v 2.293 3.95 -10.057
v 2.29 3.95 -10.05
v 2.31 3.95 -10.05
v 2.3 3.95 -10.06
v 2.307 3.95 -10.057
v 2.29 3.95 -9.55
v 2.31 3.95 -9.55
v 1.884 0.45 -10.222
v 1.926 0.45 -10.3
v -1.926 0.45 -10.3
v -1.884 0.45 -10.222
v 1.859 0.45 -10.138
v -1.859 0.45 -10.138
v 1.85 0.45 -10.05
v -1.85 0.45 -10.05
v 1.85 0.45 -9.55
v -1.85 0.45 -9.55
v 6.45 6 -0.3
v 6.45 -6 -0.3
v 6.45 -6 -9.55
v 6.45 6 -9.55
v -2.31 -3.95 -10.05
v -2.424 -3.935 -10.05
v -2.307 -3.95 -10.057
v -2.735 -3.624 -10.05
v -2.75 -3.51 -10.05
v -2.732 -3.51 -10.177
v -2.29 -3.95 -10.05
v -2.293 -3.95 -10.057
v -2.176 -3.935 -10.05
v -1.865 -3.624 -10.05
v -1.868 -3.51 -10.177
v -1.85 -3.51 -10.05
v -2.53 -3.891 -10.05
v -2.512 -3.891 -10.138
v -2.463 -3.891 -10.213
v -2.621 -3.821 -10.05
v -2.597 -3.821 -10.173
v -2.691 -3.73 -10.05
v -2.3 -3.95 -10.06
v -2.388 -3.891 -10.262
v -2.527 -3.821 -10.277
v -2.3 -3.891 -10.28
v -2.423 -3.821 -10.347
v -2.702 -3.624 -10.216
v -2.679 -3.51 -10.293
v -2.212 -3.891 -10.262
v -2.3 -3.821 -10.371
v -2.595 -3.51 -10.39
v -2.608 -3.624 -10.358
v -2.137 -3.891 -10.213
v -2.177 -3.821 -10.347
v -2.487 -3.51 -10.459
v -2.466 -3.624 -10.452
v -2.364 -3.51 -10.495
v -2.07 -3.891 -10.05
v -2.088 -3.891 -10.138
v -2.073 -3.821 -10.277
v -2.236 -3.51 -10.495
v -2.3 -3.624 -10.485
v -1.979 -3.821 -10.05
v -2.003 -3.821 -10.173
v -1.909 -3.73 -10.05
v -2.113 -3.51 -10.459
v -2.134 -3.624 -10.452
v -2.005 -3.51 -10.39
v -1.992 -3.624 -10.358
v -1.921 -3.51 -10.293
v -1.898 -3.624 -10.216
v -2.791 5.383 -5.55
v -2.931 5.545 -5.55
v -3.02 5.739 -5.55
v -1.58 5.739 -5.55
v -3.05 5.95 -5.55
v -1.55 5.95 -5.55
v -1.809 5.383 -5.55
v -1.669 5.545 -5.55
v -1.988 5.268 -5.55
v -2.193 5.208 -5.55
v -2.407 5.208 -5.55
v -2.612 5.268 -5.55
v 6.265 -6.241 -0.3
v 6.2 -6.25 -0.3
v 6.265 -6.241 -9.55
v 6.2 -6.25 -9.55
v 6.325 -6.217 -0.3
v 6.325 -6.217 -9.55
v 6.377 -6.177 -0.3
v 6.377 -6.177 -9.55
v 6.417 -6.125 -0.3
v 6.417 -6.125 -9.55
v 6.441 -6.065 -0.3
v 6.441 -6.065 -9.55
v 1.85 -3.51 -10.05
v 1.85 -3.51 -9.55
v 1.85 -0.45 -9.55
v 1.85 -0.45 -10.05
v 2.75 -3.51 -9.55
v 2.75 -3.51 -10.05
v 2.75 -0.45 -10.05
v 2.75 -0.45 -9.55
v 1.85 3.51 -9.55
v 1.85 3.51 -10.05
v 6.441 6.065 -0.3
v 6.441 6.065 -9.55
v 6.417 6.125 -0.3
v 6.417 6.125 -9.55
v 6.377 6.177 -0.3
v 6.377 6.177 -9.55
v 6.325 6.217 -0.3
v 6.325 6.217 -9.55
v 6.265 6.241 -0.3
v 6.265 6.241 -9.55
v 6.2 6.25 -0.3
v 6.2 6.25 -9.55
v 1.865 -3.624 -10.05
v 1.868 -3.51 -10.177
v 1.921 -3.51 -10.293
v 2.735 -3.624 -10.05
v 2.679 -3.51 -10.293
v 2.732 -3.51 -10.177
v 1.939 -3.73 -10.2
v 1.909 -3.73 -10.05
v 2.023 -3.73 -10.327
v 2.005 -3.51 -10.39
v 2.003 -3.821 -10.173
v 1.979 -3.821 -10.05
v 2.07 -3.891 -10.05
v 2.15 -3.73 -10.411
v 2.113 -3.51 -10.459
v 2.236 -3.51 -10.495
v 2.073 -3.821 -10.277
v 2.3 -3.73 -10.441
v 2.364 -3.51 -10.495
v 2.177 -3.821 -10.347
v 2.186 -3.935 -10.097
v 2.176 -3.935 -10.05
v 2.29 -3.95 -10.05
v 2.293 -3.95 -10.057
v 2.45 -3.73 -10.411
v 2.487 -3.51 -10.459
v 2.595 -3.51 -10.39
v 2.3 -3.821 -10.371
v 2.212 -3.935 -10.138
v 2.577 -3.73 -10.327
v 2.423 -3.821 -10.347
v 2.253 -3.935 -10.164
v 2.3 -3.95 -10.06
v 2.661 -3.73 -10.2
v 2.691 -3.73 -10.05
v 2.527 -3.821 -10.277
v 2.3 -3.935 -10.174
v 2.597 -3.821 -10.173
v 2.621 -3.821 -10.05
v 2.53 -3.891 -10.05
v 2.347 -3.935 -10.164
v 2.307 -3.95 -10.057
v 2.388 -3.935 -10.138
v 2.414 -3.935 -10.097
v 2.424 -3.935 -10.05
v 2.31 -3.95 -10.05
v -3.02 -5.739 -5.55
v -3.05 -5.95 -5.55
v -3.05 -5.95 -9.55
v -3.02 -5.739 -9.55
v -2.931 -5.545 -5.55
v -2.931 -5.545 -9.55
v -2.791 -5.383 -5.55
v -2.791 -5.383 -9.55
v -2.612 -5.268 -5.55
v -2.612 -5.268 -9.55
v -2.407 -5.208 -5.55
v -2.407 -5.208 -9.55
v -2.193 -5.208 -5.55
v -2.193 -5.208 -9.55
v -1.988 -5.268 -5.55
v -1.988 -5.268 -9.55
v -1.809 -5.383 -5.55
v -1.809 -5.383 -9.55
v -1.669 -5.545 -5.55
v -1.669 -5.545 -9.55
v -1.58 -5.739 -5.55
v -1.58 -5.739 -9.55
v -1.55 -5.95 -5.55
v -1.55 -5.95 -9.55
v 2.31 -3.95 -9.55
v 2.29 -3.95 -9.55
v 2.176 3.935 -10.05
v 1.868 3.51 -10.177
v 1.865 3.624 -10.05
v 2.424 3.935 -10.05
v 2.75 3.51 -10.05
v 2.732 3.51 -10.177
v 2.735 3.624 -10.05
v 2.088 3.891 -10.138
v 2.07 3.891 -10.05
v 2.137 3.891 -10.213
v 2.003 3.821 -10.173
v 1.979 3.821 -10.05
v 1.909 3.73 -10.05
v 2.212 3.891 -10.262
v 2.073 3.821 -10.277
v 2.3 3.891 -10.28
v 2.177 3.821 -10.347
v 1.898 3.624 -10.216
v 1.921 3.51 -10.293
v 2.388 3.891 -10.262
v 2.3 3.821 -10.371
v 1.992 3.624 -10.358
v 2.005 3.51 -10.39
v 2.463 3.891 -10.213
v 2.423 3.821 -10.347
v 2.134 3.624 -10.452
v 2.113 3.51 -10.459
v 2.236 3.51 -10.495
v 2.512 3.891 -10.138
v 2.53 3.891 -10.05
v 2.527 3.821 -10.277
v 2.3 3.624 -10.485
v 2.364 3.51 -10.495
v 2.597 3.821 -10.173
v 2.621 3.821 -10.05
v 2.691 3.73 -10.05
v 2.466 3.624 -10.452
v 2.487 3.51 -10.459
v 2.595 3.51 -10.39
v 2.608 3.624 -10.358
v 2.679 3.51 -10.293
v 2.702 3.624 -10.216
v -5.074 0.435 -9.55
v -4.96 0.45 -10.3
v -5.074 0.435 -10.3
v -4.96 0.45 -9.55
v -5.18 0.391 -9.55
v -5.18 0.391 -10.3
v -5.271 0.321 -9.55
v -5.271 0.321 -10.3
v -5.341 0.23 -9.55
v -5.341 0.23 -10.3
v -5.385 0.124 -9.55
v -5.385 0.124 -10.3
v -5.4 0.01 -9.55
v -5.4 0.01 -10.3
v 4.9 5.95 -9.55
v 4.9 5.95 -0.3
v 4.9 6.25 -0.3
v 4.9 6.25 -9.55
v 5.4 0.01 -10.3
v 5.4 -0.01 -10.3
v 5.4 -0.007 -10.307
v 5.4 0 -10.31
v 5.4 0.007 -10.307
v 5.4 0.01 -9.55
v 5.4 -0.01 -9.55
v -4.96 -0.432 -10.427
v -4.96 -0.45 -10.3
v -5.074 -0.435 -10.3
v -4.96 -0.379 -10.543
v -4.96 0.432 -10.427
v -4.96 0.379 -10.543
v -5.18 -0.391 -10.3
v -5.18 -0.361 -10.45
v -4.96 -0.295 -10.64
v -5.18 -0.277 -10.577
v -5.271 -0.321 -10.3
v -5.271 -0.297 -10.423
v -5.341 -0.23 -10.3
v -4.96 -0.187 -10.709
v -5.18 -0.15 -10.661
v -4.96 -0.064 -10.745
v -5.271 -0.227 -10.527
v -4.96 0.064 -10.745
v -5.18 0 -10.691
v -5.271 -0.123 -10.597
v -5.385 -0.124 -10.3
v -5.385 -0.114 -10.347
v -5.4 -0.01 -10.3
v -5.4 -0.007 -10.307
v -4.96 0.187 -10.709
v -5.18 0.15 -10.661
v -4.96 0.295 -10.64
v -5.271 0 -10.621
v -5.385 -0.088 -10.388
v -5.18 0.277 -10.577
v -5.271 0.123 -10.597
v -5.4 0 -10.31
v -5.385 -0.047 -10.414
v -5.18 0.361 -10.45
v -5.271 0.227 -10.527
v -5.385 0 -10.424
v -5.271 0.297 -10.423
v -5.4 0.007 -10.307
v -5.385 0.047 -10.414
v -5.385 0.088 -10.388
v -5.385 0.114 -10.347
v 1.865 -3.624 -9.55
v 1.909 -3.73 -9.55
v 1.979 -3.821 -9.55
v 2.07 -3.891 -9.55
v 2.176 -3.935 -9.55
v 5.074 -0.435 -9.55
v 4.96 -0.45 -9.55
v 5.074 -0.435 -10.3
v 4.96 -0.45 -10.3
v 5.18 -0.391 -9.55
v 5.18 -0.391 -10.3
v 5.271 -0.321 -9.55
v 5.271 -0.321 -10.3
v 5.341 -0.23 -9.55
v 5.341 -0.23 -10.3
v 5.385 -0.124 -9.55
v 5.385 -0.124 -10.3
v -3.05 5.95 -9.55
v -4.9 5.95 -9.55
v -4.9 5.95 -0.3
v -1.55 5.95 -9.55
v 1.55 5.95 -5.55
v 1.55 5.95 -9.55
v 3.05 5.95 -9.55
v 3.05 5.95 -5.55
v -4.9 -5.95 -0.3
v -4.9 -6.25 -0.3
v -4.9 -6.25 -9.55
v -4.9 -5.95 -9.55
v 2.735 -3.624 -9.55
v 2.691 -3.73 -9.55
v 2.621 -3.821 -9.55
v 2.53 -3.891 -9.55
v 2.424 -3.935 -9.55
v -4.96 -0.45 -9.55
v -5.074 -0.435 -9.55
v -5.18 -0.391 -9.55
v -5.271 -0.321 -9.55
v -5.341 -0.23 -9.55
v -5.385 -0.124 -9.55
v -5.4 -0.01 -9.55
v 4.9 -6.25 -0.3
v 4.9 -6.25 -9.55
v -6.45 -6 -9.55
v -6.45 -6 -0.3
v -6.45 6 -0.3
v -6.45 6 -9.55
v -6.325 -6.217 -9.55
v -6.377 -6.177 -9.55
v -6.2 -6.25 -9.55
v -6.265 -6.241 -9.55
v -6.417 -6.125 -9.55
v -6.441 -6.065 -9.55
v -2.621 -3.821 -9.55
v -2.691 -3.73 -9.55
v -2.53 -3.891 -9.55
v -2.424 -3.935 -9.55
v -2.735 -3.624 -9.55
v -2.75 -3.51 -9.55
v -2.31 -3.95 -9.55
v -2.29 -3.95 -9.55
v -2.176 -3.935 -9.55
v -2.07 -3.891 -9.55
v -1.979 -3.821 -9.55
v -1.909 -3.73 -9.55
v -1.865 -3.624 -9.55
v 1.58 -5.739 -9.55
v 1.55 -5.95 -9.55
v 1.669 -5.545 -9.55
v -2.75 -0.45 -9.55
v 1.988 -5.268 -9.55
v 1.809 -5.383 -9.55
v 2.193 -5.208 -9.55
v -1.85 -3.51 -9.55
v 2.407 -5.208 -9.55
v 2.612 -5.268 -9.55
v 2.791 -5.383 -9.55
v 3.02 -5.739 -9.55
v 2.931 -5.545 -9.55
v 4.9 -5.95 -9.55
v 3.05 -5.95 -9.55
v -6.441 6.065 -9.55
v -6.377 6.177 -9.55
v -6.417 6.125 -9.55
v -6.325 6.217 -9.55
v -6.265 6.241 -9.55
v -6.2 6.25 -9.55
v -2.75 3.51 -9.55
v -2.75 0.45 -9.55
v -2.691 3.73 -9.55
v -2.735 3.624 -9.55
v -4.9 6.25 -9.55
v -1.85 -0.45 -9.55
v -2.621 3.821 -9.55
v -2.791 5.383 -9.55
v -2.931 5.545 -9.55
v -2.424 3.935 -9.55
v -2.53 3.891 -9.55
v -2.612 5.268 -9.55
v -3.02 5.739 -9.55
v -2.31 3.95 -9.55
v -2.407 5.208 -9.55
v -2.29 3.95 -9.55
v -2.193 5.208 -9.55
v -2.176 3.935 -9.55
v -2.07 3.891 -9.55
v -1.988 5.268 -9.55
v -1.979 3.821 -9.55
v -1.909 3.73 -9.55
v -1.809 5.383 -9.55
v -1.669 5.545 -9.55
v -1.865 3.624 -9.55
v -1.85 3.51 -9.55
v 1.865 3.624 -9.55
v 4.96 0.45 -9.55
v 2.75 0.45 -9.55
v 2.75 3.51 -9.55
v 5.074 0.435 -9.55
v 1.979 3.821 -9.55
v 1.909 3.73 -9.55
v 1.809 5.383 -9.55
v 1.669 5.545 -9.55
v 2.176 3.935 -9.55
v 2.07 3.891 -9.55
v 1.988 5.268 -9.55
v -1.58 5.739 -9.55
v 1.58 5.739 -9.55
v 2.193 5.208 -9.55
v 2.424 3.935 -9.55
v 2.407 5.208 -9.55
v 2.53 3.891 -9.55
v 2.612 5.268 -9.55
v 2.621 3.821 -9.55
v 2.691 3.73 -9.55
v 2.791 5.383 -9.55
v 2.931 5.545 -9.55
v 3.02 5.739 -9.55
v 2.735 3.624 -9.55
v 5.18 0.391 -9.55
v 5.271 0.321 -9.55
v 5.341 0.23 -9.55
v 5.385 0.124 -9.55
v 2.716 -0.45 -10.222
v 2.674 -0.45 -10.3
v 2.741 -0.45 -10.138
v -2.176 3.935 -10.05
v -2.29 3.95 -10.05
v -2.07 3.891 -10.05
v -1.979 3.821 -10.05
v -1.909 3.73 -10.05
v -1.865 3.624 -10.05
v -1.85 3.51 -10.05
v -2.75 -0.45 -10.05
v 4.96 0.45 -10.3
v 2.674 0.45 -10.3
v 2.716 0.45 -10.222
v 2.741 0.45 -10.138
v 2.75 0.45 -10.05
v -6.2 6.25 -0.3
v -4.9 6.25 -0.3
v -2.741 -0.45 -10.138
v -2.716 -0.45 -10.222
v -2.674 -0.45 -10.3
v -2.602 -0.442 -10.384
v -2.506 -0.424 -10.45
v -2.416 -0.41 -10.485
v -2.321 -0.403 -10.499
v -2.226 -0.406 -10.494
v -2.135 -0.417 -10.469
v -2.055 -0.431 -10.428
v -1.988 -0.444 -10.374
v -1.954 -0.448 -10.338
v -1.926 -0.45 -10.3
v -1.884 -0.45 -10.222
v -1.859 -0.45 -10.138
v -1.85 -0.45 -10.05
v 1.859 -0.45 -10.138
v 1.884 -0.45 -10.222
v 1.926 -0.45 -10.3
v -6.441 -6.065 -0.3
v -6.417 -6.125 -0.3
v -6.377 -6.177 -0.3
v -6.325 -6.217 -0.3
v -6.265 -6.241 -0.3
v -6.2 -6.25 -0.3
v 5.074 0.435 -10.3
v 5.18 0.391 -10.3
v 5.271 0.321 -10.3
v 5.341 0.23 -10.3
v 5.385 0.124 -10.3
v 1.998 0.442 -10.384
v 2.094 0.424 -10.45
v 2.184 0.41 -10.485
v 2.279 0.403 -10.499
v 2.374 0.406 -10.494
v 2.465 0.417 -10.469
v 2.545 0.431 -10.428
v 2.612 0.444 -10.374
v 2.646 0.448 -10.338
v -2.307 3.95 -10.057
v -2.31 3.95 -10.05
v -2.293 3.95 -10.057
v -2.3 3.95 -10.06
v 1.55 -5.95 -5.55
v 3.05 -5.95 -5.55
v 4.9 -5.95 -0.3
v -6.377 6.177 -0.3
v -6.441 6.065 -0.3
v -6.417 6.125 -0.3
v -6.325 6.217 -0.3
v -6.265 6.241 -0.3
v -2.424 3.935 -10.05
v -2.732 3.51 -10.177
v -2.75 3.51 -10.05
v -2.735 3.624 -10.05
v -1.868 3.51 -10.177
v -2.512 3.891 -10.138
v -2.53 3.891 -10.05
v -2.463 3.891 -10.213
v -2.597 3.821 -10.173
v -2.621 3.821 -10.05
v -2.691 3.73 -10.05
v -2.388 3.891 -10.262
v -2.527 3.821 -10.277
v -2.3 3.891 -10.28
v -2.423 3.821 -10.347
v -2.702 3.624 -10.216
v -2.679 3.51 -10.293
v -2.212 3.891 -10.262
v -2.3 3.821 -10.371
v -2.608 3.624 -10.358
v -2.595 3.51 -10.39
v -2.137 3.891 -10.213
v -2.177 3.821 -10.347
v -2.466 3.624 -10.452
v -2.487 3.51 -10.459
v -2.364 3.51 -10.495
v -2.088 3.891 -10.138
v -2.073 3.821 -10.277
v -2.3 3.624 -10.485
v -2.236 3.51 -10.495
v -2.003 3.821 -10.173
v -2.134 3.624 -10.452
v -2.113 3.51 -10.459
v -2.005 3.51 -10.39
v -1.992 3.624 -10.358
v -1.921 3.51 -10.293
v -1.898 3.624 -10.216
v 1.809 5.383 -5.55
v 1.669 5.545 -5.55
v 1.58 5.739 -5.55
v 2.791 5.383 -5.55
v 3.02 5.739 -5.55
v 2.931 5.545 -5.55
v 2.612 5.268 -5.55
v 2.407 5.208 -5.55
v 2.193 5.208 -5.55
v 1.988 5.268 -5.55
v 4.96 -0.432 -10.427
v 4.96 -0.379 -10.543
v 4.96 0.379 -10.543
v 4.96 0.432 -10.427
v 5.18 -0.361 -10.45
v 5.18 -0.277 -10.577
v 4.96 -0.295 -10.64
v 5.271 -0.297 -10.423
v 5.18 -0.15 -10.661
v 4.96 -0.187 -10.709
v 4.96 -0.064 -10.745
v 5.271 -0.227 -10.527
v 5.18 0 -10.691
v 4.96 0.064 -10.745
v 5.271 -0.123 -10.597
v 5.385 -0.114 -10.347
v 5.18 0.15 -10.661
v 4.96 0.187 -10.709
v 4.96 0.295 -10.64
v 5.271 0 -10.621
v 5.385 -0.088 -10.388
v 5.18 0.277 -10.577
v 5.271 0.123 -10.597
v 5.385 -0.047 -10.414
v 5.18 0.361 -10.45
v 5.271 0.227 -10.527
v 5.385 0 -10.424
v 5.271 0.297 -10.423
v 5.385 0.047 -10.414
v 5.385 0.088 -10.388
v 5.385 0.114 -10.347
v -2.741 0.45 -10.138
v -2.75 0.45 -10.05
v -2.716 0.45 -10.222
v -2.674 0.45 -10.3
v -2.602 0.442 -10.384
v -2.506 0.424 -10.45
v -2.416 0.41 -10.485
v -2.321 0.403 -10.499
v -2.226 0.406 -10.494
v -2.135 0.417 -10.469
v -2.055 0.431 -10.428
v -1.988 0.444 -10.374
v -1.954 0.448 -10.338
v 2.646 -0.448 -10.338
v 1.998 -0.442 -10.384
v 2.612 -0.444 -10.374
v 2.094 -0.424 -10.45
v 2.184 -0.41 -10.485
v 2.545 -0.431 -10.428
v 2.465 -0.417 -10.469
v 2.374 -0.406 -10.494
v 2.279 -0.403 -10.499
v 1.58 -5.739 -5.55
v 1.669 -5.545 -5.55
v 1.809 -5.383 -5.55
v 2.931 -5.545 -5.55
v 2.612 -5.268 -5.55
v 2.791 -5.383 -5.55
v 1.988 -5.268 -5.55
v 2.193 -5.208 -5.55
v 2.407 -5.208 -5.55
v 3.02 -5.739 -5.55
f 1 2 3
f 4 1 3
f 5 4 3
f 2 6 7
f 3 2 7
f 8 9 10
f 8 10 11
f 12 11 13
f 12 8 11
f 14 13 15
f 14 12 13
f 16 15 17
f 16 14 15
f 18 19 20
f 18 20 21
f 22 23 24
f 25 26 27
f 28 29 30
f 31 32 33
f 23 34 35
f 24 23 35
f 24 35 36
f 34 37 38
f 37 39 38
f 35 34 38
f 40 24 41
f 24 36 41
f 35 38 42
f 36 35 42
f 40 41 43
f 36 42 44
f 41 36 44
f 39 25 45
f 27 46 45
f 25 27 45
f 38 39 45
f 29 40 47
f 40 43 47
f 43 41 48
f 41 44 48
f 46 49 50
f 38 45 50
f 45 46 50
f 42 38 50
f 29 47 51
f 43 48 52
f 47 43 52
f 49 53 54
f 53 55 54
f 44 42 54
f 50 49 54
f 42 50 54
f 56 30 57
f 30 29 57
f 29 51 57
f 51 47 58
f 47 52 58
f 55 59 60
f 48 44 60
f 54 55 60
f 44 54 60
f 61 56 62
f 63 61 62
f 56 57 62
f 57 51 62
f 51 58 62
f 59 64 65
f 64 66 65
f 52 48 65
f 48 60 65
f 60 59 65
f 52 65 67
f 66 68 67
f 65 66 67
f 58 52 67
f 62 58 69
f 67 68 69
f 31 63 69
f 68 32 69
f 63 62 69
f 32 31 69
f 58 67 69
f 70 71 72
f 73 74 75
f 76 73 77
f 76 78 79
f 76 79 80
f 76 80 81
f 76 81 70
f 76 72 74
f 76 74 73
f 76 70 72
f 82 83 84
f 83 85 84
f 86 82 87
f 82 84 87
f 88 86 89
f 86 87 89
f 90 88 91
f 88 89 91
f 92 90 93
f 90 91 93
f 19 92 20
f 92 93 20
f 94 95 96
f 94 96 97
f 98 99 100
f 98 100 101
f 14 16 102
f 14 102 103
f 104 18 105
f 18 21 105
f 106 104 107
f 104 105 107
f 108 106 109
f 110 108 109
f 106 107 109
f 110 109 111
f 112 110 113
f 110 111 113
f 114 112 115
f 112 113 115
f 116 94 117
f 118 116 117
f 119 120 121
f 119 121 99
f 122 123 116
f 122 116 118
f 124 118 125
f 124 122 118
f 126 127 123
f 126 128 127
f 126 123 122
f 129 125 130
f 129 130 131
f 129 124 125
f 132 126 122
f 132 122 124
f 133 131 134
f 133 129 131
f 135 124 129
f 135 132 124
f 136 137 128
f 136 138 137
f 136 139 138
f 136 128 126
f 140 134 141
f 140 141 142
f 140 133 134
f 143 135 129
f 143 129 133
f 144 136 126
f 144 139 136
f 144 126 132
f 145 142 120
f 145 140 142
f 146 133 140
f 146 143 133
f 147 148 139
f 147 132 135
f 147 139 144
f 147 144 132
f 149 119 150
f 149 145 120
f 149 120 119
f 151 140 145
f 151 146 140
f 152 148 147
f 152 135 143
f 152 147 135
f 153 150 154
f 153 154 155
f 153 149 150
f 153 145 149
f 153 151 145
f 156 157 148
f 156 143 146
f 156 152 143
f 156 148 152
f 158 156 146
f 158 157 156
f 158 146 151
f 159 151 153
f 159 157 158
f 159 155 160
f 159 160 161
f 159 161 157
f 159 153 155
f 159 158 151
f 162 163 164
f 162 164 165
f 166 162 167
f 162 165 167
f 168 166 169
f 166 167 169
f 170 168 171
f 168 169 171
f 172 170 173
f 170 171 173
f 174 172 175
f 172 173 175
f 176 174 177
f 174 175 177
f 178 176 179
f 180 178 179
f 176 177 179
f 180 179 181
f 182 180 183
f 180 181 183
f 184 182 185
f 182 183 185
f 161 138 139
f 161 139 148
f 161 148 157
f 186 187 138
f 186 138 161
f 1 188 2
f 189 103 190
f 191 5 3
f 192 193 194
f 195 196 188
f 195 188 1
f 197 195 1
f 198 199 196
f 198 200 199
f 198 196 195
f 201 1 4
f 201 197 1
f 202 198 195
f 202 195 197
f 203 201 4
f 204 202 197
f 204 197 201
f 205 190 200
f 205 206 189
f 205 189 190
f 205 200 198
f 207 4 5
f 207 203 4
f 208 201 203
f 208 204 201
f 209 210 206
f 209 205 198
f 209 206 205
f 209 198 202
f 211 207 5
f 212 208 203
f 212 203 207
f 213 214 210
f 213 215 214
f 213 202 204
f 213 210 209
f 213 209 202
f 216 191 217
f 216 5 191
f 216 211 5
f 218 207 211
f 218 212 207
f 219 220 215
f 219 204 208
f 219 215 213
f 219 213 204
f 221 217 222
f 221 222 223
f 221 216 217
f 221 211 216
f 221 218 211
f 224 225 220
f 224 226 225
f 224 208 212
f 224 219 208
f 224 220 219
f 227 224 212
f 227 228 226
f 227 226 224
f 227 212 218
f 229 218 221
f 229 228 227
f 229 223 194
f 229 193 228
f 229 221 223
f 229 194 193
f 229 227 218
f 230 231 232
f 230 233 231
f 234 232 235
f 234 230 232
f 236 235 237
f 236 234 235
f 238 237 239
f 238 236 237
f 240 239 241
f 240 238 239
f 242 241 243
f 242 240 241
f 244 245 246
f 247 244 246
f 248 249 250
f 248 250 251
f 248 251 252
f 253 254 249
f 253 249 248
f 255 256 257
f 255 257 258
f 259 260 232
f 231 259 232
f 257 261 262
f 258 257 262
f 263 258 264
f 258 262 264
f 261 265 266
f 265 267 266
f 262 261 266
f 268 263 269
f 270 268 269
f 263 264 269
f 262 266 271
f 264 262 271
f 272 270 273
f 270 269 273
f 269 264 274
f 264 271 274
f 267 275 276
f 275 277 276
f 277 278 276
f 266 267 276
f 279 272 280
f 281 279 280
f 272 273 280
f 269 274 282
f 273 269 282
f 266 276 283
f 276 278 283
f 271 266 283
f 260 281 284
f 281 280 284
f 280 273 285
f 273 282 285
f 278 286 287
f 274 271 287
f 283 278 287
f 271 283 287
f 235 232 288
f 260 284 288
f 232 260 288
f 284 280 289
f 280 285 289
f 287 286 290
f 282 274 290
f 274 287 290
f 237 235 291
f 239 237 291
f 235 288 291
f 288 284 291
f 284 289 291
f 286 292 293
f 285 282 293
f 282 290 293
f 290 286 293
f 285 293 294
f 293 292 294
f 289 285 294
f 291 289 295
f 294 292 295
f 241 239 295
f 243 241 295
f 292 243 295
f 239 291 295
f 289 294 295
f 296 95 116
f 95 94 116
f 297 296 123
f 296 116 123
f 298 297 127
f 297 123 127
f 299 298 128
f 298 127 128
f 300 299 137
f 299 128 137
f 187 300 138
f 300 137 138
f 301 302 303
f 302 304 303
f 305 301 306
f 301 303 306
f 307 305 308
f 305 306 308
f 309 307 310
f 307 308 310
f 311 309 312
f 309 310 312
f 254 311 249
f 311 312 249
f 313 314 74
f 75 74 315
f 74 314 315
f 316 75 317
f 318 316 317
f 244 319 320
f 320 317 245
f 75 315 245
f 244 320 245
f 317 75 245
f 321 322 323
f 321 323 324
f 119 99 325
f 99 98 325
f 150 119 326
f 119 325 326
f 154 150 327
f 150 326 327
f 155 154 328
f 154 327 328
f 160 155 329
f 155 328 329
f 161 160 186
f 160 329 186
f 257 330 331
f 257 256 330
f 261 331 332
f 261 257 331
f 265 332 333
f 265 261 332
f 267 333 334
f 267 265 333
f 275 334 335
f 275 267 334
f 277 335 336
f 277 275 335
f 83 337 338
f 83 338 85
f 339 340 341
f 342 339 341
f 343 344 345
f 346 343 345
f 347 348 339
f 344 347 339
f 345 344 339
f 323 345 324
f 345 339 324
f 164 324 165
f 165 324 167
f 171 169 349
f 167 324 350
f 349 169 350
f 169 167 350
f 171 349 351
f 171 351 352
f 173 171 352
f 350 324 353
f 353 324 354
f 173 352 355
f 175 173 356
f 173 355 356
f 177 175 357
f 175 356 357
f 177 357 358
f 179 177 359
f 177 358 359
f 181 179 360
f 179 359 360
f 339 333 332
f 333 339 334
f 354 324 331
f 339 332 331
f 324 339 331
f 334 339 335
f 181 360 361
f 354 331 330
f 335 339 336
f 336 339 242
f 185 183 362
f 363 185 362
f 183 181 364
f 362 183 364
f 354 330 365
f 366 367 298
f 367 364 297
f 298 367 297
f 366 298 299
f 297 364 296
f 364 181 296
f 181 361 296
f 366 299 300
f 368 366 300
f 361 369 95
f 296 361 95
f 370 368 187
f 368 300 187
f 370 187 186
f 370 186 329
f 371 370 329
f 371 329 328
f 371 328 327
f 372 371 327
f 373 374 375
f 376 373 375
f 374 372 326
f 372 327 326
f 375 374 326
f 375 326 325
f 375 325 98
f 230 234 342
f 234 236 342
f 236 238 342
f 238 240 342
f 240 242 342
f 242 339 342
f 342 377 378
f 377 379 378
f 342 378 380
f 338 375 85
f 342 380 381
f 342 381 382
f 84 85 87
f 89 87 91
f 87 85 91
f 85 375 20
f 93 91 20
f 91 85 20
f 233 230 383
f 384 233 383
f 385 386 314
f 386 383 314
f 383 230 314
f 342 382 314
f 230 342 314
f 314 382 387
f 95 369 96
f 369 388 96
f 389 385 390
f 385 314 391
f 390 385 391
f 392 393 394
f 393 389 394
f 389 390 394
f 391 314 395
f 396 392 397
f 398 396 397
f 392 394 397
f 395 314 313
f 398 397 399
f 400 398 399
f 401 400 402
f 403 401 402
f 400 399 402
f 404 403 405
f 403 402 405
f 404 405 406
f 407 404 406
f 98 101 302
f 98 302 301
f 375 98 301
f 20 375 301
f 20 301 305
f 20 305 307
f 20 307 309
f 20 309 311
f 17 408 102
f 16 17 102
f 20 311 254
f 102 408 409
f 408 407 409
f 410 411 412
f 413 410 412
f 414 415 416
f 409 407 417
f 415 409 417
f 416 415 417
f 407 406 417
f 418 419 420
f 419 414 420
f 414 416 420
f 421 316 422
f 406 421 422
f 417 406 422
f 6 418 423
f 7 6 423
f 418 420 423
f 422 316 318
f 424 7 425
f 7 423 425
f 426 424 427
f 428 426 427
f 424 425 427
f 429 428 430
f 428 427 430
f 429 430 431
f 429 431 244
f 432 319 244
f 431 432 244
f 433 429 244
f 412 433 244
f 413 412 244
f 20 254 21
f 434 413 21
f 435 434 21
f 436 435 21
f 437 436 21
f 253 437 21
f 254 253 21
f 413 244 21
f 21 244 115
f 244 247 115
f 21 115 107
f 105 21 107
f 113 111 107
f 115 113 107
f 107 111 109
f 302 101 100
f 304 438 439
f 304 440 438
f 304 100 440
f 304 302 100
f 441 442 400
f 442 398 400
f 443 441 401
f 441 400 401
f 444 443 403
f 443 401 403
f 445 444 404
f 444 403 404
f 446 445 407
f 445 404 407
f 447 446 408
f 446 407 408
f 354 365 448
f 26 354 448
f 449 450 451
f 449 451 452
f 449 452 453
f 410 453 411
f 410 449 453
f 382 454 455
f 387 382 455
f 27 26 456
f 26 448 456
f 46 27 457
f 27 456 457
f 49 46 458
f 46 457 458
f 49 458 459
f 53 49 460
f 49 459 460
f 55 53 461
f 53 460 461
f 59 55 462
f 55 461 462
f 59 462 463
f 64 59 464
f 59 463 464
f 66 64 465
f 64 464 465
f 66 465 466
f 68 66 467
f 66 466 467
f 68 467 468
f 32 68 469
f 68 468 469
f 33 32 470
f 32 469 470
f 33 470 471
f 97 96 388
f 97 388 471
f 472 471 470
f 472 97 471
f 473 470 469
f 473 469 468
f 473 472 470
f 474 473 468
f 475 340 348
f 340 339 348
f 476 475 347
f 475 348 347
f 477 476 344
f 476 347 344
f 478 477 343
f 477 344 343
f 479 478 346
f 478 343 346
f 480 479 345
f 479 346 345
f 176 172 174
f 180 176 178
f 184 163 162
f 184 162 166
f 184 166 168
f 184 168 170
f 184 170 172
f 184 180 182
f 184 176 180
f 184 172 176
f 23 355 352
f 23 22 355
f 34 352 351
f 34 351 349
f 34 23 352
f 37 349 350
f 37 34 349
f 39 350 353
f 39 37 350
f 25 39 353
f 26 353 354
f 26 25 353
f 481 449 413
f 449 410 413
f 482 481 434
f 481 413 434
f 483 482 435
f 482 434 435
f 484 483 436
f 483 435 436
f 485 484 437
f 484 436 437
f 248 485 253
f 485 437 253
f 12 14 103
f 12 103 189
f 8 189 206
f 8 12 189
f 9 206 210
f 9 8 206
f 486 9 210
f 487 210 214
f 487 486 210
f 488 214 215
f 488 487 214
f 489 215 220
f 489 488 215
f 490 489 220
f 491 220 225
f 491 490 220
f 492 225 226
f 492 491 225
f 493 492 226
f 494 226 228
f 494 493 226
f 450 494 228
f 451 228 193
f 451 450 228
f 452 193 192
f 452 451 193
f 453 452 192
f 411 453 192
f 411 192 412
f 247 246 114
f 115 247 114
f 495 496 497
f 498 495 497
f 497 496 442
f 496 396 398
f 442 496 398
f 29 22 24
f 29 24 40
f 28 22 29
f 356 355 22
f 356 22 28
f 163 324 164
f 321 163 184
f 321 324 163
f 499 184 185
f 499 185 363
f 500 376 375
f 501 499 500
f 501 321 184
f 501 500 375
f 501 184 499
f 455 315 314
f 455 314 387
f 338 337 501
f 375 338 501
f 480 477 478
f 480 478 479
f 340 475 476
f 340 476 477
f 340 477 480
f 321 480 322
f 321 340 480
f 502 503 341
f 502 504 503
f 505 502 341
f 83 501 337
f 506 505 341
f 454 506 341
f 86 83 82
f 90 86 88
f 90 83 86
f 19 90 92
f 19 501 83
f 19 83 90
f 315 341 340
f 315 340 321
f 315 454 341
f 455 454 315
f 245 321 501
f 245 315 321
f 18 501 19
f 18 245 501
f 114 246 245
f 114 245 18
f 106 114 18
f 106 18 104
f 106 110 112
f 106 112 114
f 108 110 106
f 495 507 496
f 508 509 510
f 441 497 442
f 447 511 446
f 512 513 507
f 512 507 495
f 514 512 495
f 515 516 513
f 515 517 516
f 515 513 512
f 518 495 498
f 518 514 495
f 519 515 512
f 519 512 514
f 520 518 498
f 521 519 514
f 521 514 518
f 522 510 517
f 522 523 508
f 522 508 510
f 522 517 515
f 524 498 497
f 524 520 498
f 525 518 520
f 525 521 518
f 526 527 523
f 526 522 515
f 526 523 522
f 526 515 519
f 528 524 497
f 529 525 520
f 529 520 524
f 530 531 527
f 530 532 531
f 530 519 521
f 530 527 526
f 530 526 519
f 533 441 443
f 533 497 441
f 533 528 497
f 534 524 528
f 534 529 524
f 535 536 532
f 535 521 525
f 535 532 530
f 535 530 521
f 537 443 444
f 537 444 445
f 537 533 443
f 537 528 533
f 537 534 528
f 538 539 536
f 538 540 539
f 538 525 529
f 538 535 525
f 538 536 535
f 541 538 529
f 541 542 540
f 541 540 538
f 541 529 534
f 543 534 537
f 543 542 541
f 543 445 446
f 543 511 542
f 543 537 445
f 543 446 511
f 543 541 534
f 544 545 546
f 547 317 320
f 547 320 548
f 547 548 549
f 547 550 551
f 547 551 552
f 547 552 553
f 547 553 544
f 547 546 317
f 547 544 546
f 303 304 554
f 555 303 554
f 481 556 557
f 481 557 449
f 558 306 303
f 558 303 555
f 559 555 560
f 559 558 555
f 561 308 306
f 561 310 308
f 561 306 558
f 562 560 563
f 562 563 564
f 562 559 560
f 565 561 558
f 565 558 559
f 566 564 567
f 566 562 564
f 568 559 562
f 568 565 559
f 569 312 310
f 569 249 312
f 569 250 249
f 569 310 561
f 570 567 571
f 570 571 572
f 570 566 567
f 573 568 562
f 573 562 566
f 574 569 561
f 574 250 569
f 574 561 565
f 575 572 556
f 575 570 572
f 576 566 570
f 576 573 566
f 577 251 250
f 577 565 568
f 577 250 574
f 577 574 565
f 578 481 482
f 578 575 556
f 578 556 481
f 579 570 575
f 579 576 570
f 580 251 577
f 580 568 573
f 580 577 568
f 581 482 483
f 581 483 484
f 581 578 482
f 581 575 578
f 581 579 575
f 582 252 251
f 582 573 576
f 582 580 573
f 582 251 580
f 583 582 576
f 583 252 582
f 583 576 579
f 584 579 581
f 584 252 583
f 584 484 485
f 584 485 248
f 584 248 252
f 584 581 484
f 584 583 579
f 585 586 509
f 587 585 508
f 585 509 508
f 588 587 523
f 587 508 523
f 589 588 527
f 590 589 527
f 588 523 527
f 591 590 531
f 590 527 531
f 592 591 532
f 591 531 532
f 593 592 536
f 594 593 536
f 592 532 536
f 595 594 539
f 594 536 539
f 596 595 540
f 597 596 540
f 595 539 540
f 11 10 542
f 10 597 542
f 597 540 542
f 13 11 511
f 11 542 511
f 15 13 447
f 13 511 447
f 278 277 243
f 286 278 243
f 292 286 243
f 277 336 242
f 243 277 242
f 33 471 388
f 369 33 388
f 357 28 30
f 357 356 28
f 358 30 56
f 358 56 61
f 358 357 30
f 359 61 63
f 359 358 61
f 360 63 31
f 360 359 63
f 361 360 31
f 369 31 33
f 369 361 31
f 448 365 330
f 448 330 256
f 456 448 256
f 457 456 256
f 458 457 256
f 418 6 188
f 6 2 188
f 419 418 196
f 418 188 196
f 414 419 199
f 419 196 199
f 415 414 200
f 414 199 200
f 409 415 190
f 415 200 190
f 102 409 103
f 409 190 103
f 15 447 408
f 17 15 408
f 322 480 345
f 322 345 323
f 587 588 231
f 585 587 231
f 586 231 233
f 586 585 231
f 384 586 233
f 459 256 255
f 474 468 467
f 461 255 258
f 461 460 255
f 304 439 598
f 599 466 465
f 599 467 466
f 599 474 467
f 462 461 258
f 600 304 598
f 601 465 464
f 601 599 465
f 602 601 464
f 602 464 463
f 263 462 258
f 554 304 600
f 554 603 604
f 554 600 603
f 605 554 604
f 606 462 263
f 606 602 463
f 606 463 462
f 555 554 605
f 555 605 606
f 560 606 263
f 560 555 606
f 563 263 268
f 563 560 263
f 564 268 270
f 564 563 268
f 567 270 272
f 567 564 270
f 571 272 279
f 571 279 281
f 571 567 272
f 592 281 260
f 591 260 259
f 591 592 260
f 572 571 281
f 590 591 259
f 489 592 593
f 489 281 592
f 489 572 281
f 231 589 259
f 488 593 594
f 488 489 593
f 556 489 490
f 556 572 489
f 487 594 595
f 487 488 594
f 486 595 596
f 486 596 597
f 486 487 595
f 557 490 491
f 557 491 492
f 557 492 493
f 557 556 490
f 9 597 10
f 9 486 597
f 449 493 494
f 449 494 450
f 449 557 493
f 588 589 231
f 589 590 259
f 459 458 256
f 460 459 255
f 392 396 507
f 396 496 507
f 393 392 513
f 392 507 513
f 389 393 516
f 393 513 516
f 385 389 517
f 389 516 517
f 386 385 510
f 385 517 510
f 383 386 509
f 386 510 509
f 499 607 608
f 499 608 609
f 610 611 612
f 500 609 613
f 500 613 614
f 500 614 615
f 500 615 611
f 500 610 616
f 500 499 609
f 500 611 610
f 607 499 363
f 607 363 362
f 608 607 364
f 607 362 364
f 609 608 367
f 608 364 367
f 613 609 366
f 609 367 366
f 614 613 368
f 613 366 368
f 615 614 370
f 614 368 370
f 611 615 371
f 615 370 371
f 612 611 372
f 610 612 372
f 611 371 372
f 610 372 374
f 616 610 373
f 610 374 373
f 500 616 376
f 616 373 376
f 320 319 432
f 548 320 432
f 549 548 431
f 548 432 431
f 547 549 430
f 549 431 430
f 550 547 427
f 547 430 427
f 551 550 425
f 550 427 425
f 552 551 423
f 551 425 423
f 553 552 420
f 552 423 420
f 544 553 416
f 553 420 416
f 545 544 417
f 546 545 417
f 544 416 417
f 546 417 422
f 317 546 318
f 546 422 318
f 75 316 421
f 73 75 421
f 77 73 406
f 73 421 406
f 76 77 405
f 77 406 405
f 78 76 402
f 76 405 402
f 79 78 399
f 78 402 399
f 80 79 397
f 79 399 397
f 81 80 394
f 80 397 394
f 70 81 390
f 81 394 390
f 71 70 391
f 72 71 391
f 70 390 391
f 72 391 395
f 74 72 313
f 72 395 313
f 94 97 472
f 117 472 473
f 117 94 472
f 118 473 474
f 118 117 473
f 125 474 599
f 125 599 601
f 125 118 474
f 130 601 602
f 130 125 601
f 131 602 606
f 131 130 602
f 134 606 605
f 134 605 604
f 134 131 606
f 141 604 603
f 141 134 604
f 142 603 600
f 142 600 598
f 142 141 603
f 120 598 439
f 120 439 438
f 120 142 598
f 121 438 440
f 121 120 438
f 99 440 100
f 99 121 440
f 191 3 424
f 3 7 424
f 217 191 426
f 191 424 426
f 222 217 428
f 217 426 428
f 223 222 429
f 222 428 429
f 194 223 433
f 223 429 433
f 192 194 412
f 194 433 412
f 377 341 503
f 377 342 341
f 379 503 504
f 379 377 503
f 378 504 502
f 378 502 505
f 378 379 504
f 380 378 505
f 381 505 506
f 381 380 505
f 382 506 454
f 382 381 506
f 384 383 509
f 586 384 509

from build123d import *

# Parameters (mm, degrees)
SKETCH_W        = 12.9
SKETCH_H        = 12.5
PAD_DEPTH       = 9.25
FILLET_R        = 0.25
SKETCH001_W     = 9.8
SKETCH001_H     = 0.3
POCKET_DEPTH    = 9.251
SKETCH002_R     = 0.75
POCKET001_DEPTH = 4
PAD001_DEPTH    = 3.95
FILLET001_R     = 0.44
PAD002_DEPTH    = 5.4
FILLET002_R     = 0.44


with BuildPart() as part:
    # Sketch → Pad (new body)
    with BuildSketch(Plane.XY):
        Rectangle(SKETCH_W, SKETCH_H)
    extrude(amount=-PAD_DEPTH)

    # Fillet
    fillet_edges = [part.edges().sort_by_distance(p)[0] for p in [
        (6.45, -6.25, -4.625),
        (-6.45, -6.25, -4.625),
        (-6.45, 6.25, -4.625),
        (6.45, 6.25, -4.625),
    ]]
    fillet(fillet_edges, radius=FILLET_R)

    # Sketch001 (on Face2 of Fillet) → Pocket (cut, through all)
    with BuildSketch(Plane.XY):
        with Locations((0, -6.1)):
            Rectangle(SKETCH001_W, SKETCH001_H)
        with Locations((0, 6.1)):
            Rectangle(SKETCH001_W, SKETCH001_H)
    extrude(amount=-POCKET_DEPTH, mode=Mode.SUBTRACT)

    # Sketch002 (on Face4 of Pocket) → Pocket001 (cut)
    with BuildSketch(Plane(origin=(0, 0, -9.25), x_dir=(1, 0, 0), z_dir=(0, 0, -1))):
        with Locations((-2.3, 5.95)):
            Circle(SKETCH002_R)
        with Locations((2.3, 5.95)):
            Circle(SKETCH002_R)
        with Locations((-2.3, -5.95)):
            Circle(SKETCH002_R)
        with Locations((2.3, -5.95)):
            Circle(SKETCH002_R)
    extrude(amount=-POCKET001_DEPTH, mode=Mode.SUBTRACT)

    # Sketch003 → Pad001 (join, symmetric)
    with BuildSketch(Plane.XZ):
        with BuildLine():
            ThreePointArc((-1.85, -9.25), (-2.3, -8.8), (-2.75, -9.25))
            Line((-2.75, -9.25), (-2.75, -9.75))
            ThreePointArc((-2.75, -9.75), (-2.3, -10.2), (-1.85, -9.75))
            Line((-1.85, -9.75), (-1.85, -9.25))
        make_face()
        with BuildLine():
            ThreePointArc((2.75, -9.25), (2.3, -8.8), (1.85, -9.25))
            Line((1.85, -9.25), (1.85, -9.75))
            ThreePointArc((1.85, -9.75), (2.3, -10.2), (2.75, -9.75))
            Line((2.75, -9.75), (2.75, -9.25))
        make_face()
    extrude(amount=PAD001_DEPTH, both=True)

    # Fillet001
    fillet001_edges = [part.edges().sort_by_distance(p)[0] for p in [
        (-2.3, 3.95, -10.2),
        (2.3, 3.95, -10.2),
        (2.3, -3.95, -10.2),
        (-2.3, -3.95, -10.2),
    ]]
    fillet(fillet001_edges, radius=FILLET001_R)

    # Sketch004 → Pad002 (join, symmetric)
    with BuildSketch(Plane.YZ):
        with BuildLine():
            ThreePointArc((0.45, -9.25), (0, -8.8), (-0.45, -9.25))
            Line((-0.45, -9.25), (-0.45, -10))
            ThreePointArc((-0.45, -10), (0, -10.45), (0.45, -10))
            Line((0.45, -10), (0.45, -9.25))
        make_face()
    extrude(amount=PAD002_DEPTH, both=True)

    # Fillet002
    fillet002_edges = [part.edges().sort_by_distance(p)[0] for p in [
        (-5.4, 0, -10.45),
        (5.4, 0, -10.45),
    ]]
    fillet(fillet002_edges, radius=FILLET002_R)


with BuildPart() as part_1:
    # Body placement: moved
    add(part.part.moved(Location((0, 0, -0.3))))


solid = part_1.part
